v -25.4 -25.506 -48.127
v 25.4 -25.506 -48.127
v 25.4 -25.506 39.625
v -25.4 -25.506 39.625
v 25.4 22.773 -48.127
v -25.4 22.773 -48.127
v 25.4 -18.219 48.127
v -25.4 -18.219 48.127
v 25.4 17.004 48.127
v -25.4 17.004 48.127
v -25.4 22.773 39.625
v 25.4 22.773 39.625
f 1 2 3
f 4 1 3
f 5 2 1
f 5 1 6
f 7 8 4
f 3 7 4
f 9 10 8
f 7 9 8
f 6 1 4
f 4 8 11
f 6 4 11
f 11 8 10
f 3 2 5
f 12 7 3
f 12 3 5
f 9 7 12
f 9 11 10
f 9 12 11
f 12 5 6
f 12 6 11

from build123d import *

# Parameters (mm, degrees)
F0_W          = 48.279277
F0_H          = 87.752904
F1_DEPTH      = 25.4
F1_DEPTH_BACK = 25.4


with BuildPart() as f1:
    # F0 (on Right) → F1 (new body, two sides)
    with BuildSketch(Plane.YZ) as f1_sk:
        Polygon((-18.218596, 48.127457), (-25.506034, 39.625447), (22.773243, 39.625447), (17.004022, 48.127457), align=None)
        with Locations((-1.366396, -4.251005)):
            Rectangle(F0_W, F0_H)
    extrude(amount=F1_DEPTH)
    extrude(f1_sk.sketch, amount=-F1_DEPTH_BACK)


solid = f1.part
